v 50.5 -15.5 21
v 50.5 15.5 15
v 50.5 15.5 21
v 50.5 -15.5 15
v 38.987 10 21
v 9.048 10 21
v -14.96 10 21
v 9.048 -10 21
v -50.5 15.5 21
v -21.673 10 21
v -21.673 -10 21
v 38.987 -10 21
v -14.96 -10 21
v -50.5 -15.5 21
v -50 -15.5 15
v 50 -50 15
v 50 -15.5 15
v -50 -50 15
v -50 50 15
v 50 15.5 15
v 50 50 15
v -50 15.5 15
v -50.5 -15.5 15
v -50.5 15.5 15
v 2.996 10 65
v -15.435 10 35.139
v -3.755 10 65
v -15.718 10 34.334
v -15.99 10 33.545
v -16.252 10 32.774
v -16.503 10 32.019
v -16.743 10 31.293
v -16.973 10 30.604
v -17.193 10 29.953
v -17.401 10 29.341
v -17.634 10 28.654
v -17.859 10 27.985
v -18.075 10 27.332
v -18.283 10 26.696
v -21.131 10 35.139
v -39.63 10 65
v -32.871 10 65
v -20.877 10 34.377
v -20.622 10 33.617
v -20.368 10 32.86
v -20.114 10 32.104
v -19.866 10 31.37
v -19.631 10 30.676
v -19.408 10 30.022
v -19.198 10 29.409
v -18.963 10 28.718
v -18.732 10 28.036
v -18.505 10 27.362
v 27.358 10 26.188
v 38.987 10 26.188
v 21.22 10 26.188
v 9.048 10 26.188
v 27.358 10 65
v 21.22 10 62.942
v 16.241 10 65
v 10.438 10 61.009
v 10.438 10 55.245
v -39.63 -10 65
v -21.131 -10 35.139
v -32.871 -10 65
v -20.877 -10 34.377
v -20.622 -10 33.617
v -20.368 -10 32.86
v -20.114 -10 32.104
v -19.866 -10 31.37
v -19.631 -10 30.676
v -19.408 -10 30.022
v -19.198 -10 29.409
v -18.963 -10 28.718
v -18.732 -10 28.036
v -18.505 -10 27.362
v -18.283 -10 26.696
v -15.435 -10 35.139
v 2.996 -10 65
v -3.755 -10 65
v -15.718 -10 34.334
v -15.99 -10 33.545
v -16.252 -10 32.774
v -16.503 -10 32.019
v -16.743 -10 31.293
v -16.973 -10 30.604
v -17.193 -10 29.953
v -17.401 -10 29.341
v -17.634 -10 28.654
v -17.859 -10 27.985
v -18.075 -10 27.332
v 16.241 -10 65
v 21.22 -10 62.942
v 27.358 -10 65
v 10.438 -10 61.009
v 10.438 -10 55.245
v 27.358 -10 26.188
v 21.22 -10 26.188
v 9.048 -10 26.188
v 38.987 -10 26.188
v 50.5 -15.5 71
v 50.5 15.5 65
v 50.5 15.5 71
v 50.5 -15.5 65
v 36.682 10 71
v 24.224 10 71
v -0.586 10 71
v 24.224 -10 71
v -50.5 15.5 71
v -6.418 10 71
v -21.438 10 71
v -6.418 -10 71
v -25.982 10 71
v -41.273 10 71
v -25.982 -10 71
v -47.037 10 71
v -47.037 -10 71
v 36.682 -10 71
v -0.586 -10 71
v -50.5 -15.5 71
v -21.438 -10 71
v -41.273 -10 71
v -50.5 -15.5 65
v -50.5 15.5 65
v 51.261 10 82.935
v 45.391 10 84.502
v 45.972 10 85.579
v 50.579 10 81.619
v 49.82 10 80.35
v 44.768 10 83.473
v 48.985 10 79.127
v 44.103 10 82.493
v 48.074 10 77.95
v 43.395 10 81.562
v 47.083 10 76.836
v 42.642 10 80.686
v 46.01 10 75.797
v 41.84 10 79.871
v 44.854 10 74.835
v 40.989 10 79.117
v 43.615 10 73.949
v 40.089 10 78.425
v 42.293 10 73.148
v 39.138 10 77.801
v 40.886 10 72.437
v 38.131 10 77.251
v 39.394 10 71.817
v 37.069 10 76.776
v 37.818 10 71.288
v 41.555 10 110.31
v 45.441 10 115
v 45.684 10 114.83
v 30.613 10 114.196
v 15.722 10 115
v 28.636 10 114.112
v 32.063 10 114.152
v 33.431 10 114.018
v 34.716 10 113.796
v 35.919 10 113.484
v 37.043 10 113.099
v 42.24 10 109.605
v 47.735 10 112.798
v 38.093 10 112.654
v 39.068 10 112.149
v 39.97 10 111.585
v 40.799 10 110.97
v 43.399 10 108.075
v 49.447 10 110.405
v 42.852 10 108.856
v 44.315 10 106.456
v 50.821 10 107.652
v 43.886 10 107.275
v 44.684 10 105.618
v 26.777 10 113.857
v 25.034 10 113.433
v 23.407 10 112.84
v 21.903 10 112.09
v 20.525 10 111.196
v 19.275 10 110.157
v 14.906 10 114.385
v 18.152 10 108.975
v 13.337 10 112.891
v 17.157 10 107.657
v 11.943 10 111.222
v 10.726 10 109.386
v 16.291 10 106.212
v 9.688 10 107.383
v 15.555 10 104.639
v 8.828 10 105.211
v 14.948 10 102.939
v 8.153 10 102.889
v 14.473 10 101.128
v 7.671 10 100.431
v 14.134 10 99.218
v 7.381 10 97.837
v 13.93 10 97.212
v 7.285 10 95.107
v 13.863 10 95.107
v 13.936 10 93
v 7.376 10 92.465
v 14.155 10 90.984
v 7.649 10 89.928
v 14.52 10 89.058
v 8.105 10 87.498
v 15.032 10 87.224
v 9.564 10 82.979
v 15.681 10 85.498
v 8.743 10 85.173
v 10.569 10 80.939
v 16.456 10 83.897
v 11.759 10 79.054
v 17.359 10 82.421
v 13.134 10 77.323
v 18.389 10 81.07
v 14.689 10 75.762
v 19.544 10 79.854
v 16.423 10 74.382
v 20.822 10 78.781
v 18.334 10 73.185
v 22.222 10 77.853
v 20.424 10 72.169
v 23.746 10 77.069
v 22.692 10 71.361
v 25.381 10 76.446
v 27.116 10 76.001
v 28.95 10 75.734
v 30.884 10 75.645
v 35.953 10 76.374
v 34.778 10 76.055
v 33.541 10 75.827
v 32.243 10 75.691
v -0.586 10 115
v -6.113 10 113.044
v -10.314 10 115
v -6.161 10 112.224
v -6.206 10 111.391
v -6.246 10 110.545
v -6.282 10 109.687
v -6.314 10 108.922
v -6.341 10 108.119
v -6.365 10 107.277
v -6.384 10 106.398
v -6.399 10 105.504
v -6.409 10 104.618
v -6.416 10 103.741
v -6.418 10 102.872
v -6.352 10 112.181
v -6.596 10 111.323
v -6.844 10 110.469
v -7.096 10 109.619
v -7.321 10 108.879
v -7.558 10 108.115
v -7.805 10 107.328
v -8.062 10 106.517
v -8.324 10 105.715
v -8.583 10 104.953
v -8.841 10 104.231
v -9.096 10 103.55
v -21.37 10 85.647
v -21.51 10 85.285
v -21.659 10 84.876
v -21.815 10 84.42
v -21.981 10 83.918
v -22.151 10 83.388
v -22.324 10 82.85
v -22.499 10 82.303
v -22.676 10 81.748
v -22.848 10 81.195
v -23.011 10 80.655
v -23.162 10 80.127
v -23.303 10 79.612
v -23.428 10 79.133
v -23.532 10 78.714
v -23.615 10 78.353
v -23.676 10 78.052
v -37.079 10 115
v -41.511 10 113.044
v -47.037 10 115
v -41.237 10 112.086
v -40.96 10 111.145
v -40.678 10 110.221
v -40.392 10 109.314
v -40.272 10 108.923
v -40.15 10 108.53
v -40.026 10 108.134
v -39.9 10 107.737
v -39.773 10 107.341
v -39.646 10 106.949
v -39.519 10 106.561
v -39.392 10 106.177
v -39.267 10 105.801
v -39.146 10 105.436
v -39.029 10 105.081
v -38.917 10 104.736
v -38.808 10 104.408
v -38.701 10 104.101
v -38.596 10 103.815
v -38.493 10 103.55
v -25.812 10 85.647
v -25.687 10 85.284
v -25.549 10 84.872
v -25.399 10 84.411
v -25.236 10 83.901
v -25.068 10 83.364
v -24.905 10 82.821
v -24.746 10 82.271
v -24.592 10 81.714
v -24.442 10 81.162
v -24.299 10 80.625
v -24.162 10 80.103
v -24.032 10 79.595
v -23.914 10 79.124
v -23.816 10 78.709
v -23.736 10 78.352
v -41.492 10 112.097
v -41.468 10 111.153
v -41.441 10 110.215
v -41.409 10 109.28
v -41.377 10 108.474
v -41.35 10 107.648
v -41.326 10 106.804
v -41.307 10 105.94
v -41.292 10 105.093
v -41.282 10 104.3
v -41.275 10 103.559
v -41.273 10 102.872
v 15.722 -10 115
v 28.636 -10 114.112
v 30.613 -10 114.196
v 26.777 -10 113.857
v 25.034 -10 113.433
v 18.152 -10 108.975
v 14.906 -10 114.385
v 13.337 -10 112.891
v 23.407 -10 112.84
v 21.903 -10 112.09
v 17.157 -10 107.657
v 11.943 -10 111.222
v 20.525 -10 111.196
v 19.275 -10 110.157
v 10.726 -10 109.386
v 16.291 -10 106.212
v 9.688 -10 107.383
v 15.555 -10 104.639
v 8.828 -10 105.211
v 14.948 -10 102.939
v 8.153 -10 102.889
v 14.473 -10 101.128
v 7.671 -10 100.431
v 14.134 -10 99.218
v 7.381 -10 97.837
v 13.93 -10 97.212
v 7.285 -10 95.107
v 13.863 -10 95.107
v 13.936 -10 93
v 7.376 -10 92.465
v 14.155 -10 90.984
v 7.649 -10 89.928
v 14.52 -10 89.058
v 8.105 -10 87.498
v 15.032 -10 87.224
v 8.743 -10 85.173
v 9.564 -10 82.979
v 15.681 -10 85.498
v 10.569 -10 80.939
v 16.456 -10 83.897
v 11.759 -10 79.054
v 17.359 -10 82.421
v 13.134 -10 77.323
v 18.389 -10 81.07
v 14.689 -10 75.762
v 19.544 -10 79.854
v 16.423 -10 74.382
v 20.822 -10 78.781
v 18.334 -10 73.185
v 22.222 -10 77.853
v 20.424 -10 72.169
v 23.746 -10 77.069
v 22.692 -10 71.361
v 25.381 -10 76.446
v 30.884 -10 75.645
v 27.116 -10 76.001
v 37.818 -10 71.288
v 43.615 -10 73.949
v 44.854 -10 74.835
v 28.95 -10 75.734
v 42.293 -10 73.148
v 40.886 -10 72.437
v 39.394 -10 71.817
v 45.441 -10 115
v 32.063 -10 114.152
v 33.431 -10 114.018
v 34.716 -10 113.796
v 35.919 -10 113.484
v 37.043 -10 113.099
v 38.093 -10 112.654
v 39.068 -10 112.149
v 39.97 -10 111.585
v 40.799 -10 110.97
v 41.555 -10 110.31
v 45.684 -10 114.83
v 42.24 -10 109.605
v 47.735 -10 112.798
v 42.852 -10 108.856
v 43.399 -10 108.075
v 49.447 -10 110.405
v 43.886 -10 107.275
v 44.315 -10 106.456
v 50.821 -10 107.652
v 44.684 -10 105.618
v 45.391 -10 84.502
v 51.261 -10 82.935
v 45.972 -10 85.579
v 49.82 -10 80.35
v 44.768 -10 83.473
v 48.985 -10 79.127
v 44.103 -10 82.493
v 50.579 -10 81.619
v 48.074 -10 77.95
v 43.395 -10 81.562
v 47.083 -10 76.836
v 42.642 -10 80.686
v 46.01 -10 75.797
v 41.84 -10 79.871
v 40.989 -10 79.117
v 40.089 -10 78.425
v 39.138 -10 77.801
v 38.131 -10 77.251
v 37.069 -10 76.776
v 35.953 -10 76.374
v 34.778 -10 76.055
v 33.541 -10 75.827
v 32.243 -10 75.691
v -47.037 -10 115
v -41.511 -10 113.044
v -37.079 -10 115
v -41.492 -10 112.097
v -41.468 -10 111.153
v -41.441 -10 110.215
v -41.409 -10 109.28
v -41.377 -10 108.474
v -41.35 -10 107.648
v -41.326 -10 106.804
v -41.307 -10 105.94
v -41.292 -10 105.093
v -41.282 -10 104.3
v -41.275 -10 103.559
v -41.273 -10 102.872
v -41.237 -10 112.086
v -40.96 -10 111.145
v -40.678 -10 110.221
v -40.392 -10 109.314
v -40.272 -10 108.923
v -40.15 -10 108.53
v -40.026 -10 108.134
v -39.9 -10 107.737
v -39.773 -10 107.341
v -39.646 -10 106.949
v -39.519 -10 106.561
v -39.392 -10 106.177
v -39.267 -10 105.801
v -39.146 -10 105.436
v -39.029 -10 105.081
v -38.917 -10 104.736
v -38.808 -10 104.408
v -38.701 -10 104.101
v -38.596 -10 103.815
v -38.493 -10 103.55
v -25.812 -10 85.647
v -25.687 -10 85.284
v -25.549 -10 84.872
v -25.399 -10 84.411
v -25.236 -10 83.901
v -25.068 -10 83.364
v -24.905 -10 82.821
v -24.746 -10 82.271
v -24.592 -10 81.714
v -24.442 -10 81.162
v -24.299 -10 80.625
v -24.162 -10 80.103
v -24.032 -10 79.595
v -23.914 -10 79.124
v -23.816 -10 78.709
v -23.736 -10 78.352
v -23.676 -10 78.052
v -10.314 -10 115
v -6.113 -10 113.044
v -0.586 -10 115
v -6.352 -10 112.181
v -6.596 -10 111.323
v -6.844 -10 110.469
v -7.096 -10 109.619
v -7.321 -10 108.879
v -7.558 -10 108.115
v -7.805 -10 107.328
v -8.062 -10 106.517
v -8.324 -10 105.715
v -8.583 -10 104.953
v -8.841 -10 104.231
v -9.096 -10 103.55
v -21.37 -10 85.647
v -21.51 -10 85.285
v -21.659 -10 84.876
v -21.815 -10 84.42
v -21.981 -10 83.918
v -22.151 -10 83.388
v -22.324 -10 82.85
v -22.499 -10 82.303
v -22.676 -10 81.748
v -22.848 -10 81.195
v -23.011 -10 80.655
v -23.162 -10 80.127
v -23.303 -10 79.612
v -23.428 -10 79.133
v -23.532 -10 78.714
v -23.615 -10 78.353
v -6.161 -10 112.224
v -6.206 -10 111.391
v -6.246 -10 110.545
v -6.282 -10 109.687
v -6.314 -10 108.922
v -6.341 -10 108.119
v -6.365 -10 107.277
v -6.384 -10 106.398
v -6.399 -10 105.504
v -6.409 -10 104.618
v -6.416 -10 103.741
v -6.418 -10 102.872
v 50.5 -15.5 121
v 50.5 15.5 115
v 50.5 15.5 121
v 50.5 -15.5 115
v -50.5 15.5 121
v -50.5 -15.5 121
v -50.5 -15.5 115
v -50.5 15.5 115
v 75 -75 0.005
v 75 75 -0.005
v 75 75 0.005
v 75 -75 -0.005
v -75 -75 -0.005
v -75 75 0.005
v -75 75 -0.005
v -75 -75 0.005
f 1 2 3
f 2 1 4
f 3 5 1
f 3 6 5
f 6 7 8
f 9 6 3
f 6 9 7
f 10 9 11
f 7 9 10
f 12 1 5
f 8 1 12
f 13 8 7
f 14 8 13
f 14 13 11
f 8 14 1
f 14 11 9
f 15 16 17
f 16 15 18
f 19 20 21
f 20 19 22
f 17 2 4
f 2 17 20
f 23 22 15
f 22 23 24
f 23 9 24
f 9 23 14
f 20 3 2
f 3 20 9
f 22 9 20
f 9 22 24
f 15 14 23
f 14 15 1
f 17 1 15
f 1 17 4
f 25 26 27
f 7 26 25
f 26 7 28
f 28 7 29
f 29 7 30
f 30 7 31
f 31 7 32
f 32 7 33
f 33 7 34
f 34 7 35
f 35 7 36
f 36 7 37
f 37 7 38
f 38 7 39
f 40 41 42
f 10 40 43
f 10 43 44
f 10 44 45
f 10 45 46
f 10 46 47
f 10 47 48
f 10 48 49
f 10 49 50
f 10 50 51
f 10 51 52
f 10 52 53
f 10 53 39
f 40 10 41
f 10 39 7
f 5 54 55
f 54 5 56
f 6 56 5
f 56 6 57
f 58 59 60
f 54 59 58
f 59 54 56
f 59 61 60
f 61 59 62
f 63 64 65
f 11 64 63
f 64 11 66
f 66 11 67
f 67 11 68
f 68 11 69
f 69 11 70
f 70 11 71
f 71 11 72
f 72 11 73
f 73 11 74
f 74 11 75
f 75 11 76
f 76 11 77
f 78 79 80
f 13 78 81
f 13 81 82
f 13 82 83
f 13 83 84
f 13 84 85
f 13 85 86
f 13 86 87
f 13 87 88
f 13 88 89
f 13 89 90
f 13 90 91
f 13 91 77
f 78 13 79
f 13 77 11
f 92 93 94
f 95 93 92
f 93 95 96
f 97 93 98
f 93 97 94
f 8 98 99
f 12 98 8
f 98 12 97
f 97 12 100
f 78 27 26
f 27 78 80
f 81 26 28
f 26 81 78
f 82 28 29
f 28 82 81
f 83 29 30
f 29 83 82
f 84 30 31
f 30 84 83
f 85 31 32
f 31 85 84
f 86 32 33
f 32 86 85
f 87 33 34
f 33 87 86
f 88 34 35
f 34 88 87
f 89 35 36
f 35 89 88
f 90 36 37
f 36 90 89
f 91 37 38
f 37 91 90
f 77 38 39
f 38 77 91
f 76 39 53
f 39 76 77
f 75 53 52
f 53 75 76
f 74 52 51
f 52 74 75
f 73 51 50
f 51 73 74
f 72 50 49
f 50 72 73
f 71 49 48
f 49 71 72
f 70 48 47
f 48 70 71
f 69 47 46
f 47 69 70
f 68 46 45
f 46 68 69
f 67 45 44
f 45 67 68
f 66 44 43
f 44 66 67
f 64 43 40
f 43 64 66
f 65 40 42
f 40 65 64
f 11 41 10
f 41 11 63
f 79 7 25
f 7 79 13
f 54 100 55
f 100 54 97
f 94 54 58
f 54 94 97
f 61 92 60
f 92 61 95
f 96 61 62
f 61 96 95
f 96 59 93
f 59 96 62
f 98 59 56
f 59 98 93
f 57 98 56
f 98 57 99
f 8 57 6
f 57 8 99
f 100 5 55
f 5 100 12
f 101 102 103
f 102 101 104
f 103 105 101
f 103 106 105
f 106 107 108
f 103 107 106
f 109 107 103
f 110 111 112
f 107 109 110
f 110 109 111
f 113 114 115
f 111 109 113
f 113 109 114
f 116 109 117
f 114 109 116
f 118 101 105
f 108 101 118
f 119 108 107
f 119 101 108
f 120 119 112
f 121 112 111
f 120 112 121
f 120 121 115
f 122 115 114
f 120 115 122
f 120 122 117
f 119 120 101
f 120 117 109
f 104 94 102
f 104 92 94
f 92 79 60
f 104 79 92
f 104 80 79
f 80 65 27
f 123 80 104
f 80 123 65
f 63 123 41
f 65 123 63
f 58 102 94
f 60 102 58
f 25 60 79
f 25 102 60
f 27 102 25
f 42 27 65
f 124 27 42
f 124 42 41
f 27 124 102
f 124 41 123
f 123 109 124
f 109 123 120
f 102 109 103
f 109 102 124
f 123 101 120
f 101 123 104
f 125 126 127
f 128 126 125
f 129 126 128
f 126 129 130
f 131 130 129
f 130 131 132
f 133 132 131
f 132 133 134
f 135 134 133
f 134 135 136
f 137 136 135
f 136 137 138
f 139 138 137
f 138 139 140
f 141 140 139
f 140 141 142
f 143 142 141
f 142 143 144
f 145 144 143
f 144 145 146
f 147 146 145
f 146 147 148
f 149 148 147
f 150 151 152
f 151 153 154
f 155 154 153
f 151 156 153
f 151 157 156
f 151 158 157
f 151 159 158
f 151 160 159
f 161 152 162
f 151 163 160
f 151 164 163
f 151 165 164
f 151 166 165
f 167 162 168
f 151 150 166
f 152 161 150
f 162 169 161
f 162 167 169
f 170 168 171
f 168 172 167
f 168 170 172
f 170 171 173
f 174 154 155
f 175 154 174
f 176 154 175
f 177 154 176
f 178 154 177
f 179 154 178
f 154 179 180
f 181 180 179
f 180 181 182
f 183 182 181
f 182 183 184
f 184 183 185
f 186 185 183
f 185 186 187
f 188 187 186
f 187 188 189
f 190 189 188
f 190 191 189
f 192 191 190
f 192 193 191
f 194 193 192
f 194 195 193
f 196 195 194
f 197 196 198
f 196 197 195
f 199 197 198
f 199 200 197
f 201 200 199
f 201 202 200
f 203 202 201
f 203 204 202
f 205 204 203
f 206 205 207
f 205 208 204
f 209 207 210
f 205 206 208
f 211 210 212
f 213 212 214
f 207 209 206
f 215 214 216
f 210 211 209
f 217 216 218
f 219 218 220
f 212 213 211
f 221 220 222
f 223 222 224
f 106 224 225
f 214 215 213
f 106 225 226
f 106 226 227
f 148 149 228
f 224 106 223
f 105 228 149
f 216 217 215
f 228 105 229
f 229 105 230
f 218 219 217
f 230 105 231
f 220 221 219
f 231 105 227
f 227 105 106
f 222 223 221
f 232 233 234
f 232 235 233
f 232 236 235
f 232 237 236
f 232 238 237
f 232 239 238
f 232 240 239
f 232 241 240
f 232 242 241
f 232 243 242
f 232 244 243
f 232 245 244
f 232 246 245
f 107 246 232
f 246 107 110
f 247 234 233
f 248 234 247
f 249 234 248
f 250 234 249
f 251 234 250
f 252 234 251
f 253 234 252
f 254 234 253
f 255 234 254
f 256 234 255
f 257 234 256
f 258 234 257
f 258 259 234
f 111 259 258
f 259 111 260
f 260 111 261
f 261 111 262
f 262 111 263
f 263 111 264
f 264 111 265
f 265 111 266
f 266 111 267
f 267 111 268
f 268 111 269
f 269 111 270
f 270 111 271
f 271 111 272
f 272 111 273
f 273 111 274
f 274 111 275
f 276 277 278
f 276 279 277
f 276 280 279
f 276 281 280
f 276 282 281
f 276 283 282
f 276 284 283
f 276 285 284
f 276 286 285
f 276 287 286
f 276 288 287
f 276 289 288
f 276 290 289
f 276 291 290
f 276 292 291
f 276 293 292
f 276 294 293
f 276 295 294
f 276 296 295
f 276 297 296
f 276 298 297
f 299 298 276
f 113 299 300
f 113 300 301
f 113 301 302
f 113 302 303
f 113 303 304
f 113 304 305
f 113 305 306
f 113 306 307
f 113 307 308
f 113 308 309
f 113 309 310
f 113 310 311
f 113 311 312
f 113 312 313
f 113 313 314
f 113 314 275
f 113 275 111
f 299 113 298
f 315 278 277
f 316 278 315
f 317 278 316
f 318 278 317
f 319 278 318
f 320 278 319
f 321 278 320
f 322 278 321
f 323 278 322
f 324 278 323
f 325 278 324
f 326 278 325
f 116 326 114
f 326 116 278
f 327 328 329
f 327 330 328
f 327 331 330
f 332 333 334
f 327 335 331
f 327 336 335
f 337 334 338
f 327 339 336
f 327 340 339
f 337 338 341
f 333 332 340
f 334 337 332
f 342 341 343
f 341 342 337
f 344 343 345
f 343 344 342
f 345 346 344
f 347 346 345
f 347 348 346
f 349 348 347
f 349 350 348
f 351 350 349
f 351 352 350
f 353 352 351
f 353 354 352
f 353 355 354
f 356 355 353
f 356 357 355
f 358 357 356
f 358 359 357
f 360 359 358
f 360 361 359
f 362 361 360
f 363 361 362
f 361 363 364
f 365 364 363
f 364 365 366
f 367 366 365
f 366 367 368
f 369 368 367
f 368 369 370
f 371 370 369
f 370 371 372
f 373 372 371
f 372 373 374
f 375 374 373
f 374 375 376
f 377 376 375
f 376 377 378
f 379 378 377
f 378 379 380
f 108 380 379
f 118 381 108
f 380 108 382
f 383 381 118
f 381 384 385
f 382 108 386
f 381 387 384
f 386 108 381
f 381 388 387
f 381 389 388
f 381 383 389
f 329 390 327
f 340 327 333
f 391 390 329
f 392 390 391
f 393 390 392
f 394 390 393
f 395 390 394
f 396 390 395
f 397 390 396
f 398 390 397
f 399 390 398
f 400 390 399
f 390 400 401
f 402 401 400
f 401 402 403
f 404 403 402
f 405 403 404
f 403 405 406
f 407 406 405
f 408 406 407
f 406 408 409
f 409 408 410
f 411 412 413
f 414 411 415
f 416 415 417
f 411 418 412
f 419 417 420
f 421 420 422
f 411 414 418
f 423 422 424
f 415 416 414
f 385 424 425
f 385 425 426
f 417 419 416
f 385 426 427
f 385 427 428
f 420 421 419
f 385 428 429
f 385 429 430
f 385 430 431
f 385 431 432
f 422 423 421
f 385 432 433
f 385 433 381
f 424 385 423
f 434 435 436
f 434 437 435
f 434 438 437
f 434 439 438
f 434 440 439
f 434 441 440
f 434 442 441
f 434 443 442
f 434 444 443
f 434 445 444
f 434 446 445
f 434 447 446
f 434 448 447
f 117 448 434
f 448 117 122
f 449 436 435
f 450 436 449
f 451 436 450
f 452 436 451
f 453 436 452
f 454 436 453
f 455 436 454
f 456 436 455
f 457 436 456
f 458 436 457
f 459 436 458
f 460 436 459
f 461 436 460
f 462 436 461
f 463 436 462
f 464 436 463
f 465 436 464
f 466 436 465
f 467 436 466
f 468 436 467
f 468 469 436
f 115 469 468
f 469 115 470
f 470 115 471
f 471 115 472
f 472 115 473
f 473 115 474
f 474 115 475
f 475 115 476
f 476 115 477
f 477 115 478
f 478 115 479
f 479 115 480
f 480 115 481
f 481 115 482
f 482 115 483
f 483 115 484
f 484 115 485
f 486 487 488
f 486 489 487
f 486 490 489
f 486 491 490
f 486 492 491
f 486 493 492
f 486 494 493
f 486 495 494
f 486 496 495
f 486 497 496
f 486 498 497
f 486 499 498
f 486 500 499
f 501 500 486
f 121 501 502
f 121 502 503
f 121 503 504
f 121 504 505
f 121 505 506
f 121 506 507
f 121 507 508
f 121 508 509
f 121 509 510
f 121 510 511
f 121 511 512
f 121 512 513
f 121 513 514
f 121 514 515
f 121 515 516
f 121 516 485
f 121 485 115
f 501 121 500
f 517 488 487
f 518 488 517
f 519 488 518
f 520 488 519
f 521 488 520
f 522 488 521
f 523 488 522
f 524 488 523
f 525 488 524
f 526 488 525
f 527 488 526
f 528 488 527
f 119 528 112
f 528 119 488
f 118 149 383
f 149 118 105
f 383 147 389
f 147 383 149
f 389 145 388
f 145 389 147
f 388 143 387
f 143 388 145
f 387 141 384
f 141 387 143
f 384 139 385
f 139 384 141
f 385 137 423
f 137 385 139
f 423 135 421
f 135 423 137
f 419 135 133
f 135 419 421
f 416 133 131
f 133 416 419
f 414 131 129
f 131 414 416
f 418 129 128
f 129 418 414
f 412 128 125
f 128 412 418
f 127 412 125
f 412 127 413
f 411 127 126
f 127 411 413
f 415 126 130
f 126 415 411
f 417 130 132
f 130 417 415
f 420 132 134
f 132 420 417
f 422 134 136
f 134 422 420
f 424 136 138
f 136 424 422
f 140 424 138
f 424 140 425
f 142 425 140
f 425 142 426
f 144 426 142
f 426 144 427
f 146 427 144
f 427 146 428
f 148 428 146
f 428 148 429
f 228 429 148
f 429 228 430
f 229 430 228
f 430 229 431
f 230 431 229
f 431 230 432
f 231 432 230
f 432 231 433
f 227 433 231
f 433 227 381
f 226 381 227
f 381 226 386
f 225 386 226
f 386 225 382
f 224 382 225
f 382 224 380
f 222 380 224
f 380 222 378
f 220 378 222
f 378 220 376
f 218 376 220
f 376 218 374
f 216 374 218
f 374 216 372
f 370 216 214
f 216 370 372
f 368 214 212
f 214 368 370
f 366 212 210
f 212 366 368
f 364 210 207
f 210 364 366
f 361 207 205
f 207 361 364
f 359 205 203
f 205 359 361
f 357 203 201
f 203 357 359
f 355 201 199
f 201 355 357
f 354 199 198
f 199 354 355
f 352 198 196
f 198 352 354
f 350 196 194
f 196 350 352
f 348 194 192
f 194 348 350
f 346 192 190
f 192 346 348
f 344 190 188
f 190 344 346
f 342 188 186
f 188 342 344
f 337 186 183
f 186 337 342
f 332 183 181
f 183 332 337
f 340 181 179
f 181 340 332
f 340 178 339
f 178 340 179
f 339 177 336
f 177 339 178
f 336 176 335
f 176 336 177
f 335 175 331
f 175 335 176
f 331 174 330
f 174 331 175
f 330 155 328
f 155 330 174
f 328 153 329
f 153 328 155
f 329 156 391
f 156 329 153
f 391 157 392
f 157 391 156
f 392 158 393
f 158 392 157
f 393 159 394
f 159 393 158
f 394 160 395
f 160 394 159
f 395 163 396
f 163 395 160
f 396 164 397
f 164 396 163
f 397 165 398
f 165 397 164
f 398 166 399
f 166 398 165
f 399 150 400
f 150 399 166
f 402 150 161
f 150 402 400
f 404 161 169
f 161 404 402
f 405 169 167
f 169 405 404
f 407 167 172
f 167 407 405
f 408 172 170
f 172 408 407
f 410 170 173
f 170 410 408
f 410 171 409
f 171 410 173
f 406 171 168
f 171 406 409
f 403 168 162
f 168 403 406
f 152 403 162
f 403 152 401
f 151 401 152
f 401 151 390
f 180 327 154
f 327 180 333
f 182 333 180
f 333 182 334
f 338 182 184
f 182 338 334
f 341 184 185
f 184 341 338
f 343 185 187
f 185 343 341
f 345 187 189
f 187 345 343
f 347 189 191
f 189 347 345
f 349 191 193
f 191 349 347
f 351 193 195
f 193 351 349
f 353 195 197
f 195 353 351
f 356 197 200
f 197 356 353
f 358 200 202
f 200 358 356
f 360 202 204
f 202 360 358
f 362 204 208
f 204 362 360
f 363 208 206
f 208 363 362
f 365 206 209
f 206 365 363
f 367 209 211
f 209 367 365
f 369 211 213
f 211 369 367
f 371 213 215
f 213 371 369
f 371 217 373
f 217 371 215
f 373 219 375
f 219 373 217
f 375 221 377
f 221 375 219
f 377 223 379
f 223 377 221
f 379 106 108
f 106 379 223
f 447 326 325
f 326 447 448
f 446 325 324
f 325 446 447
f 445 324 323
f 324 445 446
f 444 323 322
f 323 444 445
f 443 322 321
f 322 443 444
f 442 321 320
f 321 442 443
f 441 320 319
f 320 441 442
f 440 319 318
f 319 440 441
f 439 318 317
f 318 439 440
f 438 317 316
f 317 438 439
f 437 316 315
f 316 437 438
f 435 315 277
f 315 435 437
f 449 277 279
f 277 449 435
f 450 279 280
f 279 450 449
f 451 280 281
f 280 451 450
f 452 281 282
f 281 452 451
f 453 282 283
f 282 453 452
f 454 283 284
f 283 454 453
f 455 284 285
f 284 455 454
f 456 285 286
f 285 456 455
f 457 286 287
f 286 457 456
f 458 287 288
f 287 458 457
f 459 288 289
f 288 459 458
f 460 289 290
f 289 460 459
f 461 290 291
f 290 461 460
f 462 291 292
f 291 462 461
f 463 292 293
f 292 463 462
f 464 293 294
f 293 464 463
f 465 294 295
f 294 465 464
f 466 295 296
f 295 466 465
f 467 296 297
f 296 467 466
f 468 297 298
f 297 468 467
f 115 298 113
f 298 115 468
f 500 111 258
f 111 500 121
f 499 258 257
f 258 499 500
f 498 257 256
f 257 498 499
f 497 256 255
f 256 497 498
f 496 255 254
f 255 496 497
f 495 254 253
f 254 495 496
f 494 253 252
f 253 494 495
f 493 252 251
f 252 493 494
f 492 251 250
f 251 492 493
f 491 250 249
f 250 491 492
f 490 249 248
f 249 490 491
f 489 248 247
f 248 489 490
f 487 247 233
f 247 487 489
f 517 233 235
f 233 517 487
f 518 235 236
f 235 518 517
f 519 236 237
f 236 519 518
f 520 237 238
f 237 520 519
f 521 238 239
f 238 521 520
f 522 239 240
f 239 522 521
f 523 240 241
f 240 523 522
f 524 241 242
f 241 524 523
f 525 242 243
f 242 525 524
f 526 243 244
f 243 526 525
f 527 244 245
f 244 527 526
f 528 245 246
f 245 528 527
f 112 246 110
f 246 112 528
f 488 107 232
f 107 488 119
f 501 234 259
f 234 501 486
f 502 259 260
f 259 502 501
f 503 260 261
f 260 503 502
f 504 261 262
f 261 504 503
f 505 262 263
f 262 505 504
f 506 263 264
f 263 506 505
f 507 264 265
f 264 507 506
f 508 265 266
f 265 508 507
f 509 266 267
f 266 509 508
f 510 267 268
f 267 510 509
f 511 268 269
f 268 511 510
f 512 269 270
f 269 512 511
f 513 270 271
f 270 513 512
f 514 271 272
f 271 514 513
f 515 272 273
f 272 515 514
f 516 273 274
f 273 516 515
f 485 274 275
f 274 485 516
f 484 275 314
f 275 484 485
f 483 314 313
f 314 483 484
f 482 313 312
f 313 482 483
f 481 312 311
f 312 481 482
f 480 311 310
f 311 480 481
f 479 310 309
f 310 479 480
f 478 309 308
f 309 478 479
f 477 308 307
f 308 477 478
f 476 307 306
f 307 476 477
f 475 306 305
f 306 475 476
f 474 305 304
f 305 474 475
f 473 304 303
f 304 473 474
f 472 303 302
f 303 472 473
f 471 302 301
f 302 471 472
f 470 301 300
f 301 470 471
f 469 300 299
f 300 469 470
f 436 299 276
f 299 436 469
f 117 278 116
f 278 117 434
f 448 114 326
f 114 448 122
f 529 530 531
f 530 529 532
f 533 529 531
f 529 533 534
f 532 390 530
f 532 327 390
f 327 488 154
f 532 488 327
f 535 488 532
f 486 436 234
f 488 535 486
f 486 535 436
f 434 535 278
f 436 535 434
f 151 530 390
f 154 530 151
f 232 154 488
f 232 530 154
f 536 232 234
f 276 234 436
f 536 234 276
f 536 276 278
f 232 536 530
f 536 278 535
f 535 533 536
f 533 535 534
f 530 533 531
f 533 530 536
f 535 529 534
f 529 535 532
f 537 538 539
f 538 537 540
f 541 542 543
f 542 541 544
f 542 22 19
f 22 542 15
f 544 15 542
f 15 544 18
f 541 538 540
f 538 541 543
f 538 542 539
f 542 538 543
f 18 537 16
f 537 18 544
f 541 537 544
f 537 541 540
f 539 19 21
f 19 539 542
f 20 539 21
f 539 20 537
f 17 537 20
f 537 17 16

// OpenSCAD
//Trophies
//because everyone's a weiner
//by eriqjo May 2015

/* [Select Parts] */

Include_Base = 1; // [1:Yes, 2:No]

Include_Pillars = 3; // [1:All, 2:Standalone Pillar, 3:None]

Include_Top_Plate = 2; // [1:Yes, 2:No]

/**********************************************************************/

/* [Core Dimensions] */

//Style
Base_Style = 2; // [1:1-Classic, 2:2-Tapered Pedastal, 3:3-Octagonal, 4:4-Squared Semi-Circle]

dimA = 150;
dimB = 150;
dimC = 15;
dimD = 5;
dimE = 100;
dimF = 40;

//Hole depth, mm:
Hole_Depth = 0;

//Hole diameter, mm:
Hole_Dia = 6;

//Peg height, mm:
Peg_Height = 0;

//Peg diameter, mm:
Peg_Dia = 5.5;

/**********************************************************************/

/* [Pillars] */

//Round or square pillar
Pillar_Shape = 1; // [1:Square, 2:Circle]

//Number of pillars
Number_of_Pillars = 0; // [0:0, 2:2, 4:4]

//Center-to-center distance of the pillars in the x-direction, mm: 
X_Between = 80;

//Center-to-center distance of the pillars in the y-direction (if 4 pillars), mm: 
Y_Between = 50;

//Height, mm:
Pillar_Height = 0;

//Diameter of circle/width of square, mm:
Outer_Dia = 15; // [5:50]

//# of depressions (if square, # per side limit 3):
Number_of_Depressions = 10; // [0:20]

//Number of pillar twists (90 degrees each):
Twists = 1; // [0:5]

//Slide to move pillars fore-aft as desired:
Y_Adjustment = 0; // [-50:50]

//Slide to move pillars side-to-side as desired:
X_Adjustment = 0; // [-50:50]

/******************************************************************/

/* [ emblem ] */
emblem_text = "V1";
emblem_text_2 = "MC";
emblem_height = 50;
emblem_depth = 20;
emblem_plate_thickness = 6;

/* [Top Plate] */

//Thickness to make the top plate, mm:
Plate_Thickness = 0;

//# of pegs in the x-direction
X_Pegs = 0; // [0:4]

//Distance between each peg in x-direction, mm:
X_Peg_Offset = 90;

//# of pegs in the y-direction:
Y_Pegs = 0; // [0:4]

//Distance between each peg in y-direction, mm:
Y_Peg_Offset = emblem_depth;

//Height of the top-plate pegs, mm:
Top_Peg_Height = 0;

//Diameter of the top-plate pegs
Top_Peg_Diameter = 5.5;


module emblem() {
    z_emblem_base = dimC - emblem_plate_thickness;

    translate([0, 0, z_emblem_base]){
        translate([
            -X_Peg_Offset / 2 - Top_Peg_Diameter, 
            -Y_Peg_Offset / 2 - Top_Peg_Diameter, 
            emblem_plate_thickness])
            cube([
                X_Peg_Offset + 2 * Top_Peg_Diameter, 
                Y_Peg_Offset + 2 * Top_Peg_Diameter, 
                emblem_plate_thickness]);
        translate([0, emblem_depth / 2, 2 * emblem_plate_thickness])
            rotate([90, 0, 0])
                linear_extrude(emblem_depth)
                    text(emblem_text, emblem_height, halign="center");
        translate([
            -X_Peg_Offset / 2 - Top_Peg_Diameter, 
            -Y_Peg_Offset / 2 - Top_Peg_Diameter, 
            emblem_plate_thickness + emblem_height])
            cube([X_Peg_Offset + 2 * Top_Peg_Diameter, 
                Y_Peg_Offset + 2 * Top_Peg_Diameter, emblem_plate_thickness]);
        translate([0, emblem_depth / 2, 2 * emblem_plate_thickness + emblem_height])
            rotate([90, 0, 0])
                linear_extrude(emblem_depth)
                    text(emblem_text_2, emblem_height, halign="center");
        translate([
            -X_Peg_Offset / 2 - Top_Peg_Diameter, 
            -Y_Peg_Offset / 2 - Top_Peg_Diameter, 
            2 * emblem_height + emblem_plate_thickness])
            cube([X_Peg_Offset + 2 * Top_Peg_Diameter, 
                Y_Peg_Offset + 2 * Top_Peg_Diameter, emblem_plate_thickness]);
    }
}

emblem();

/******** END CUSTOMIZER VARIABLES **********/

depression_limiter = (3 < Number_of_Depressions) ? 3 : Number_of_Depressions; //don't want to make more than 3 for squares
square_depression_dia = (Outer_Dia)/(2 * depression_limiter);
circle_depression_dia = (3.14 * Outer_Dia)/(2 * Number_of_Depressions);


module array(y_correction = 0){

	n_x = (Number_of_Pillars > 0) ? 2 : 0;
	x_dist = X_Between;
	n_y = (Number_of_Pillars > 0) ? Number_of_Pillars/2 : 0;
	y_dist = Y_Between;

	translate([X_Adjustment, Y_Adjustment, 0]){	//manually moving the pillars with the slider control
		translate([-1*(n_x-1)*x_dist/2, -(n_y-1)*y_dist/2 + y_correction, 0]){
			for (j = [0:n_y-1]){
				for (i = [0:n_x-1]){
					translate([i*x_dist, j*y_dist, 0])
						children(0);
				}//for i
			}//for j
		}//translate
	}//translate
}//module array

module topPegArray(y_correction = 0){
	if(X_Pegs > 0 && Y_Pegs > 0){
		n_x = X_Pegs;
		x_dist = X_Peg_Offset;
		n_y = Y_Pegs;
		y_dist = Y_Peg_Offset;

		translate([0, 0, 0]){	//manually moving the pillars with the slider control
			translate([-1*(n_x-1)*x_dist/2, -(n_y-1)*y_dist/2 + y_correction, 0]){
				for (j = [0:n_y-1]){
					for (i = [0:n_x-1]){
						translate([i*x_dist, j*y_dist, 0])
							children(0);
					}//for i
				}//for j
			}//translate
		}//translate
	}//if
}//module topPegArray

module pegs(z_move = 0){
	translate([0,0,z_move])
		cylinder(h = Peg_Height, r = Peg_Dia/2, $fn = 12, center = false);
}//module add pegs to

module holes(z_move = 0){
	translate([0, 0, z_move - 0.1])
		cylinder(h = Hole_Depth + 0.1, r = Hole_Dia/2, $fn = 12, center = false);
}//module holes

module pillars(holeZ = 0, pegZ = Pillar_Height, translateZ = 0){

	translate([0, 0, translateZ]){
		if (Pillar_Shape == 1){	//square pillar
			union(){
				difference(){		//subtracts the depressions and bottom holes
					linear_extrude(height = Pillar_Height, center = false, convexity = 20, twist = 90 * Twists)	//main square body for pillar
						square([Outer_Dia, Outer_Dia], center = true);
					translate([0, 0, -0.5]){
						for (i = [0:3]){	//for each of the 4 sides of the square
							for (j = [0:depression_limiter - 1]){	//for the number of depressions per side
								rotate([0, 0, i * 90])
									linear_extrude(height = Pillar_Height + 1, center = false, convexity = 20, twist = 90 * Twists)
										translate([Outer_Dia/2, Outer_Dia * ((j + 1)/(depression_limiter + 1)) - Outer_Dia/2, -0.1])
											circle(r = square_depression_dia/2, center = true);		//subtracting this cylinder from the square
							}//for j
						}//for i
					}//translate	
					holes();
				}//difference
				pegs(pegZ);
			}//union
		}//if
			
		if (Pillar_Shape == 2){  //round pillar
			union(){
				difference(){
					cylinder(h = Pillar_Height, r = Outer_Dia/2, $fn = 20, center = false);	//the solid cylinder
					translate([0, 0, -0.5]){
						for (i = [0:Number_of_Depressions-1]){		//creating all of the subtraction cylinders
							rotate(a = [0, 0, i * 360/Number_of_Depressions])
								linear_extrude(height = Pillar_Height + 1, center = false, convexity = 20, twist = 90 * Twists)	
									translate([Outer_Dia/2, 0, -0.1])
										circle(r = circle_depression_dia/2, center = true);
						}//for
					}//translate
					//TODO create new holes function
					holes();
				}//difference
				//TODO correct peg function
				pegs(pegZ);
			}//union
		}//if
	}//translate
		
}//module

module pillarHelper(y, z){

		if (Include_Pillars == 1){	//include all pillars
			array(y_correction = y)
				pillars(translateZ = z);
		}//if include pillars == 1
		
		if (Include_Pillars == 2){
			pillars();
		}
}


//********************************BASE 1********************************

if (Base_Style == 1){

	y_center = dimB/2 - dimE/2 - dimD;
	z_base_peg = dimC + dimF;
	z_pillar_hole = z_base_peg;		//the hole in the pillar is the same height as the peg in the base
	z_pillar_peg = z_pillar_hole + Pillar_Height;
	z_top_plate_hole = z_pillar_peg;
	z_top_plate_peg = z_top_plate_hole + Plate_Thickness;
			
	if (Include_Base == 1){	//build base		
		union(){
			translate([0, 0, dimC/2])
				cube([dimA, dimB, dimC], center = true);
			hull(){
				translate([0, 0, dimC/2])	//base of the wedge
					cube([dimA - 2*dimD, dimB - 2*dimD, dimC], center = true);
				translate([0, ((dimB - 2*dimD) - dimE)/2, (dimC + dimF)/2])		//top platform of the wedge
					cube([dimA - 2*dimD, dimE, dimC + dimF], center = true);
			}//hull
			if (Number_of_Pillars > 0){		//doesn't add pegs if there are 0 pillars
				array(y_center)
					pegs(z_base_peg);
			}//if
		}//union
	}//if include base
	
	pillarHelper(y_center, z_base_peg);	//build pillars if included
	
	if (Include_Top_Plate == 1){
		difference(){
			translate( [0, ((dimB - 2*dimD) - dimE)/2, z_top_plate_hole + Plate_Thickness/2]){
				union(){
					cube([dimA - 2*dimD, dimE, Plate_Thickness], center = true);
					topPegArray(0)
						pegs(Plate_Thickness/2);
				}//union
			}//translate
			array(y_center)
				holes(z_top_plate_hole);
		}//difference
	}//if include top plate
	
}//base1

//********************************BASE 2********************************

if (Base_Style == 2){

	y_center = 0;
	z_base_peg = dimC;
	z_pillar_hole = z_base_peg;		//the hole in the pillar is the same height as the peg in the base
	z_pillar_peg = z_pillar_hole + Pillar_Height;
	z_top_plate_hole = z_pillar_peg;
	z_top_plate_peg = z_top_plate_hole + Plate_Thickness;
	
	if (Include_Base ==1){	//build base
		union(){
			hull(){
				cube([dimA, dimB, 0.01], center = true);
				translate([0, 0, dimC/2])
					cube([dimE, dimE, dimC], center = true);
			}//hull
			if (Number_of_Pillars > 0){
				array(y_center)
					pegs(z_base_peg);
			}//if
		}//union
	}//if include base
	
	//pillarHelper(y_center, z_base_peg);
	
	if (Include_Top_Plate == 1){
		difference(){
			translate( [0, 0, z_top_plate_hole + Plate_Thickness/2]){
				union(){
					cube([dimE, dimE, Plate_Thickness], center = true);
					topPegArray(0)
						pegs(Plate_Thickness/2);
				}//union
			}//translate
			//array(y_center)
			//	holes(z_top_plate_hole);
		}//difference
	}//module include top plate
	
}//base2

//********************************BASE 3********************************	

if (Base_Style == 3){

	y_center = 0;
	z_base_peg = dimC + dimF;
	z_pillar_hole = z_base_peg;		//the hole in the pillar is the same height as the peg in the base
	z_pillar_peg = z_pillar_hole + Pillar_Height;
	z_top_plate_hole = z_pillar_peg;
	z_top_plate_peg = z_top_plate_hole + Plate_Thickness;

	if (Include_Base ==1){	//build base
		union(){
			translate([0, 0, dimC/2])
				cube([dimA, dimA, dimC], center = true);
			translate([0, 0, dimC - 0.1])
				rotate([0, 0, 135/2])
					cylinder(h = dimF + 0.1, r = dimA/2, center = false, $fn = 8);
			if (Number_of_Pillars > 0){
				array(y_center)
					pegs(z_base_peg);
			}//if
		}//union
	}//if include base	
	
	pillarHelper(y_center, z_base_peg);
	
	if (Include_Top_Plate == 1){
		difference(){
			translate( [0, 0, z_top_plate_hole + Plate_Thickness/2]){
				union(){
					rotate([0, 0, 135/2])
						cylinder(h = Plate_Thickness, r = dimA/2, center = true, $fn = 8);
					topPegArray(0)
						pegs(Plate_Thickness/2);
				}//union
			}//translate
			array(y_center)
				holes(z_top_plate_hole);
		}//difference
	}// include top plate
	
}//base3

//********************************BASE 4********************************

if (Base_Style == 4){

	y_center = (dimA - dimB)/2;
	z_base_peg = dimC;
	z_pillar_hole = z_base_peg;		//the hole in the pillar is the same height as the peg in the base
	z_pillar_peg = z_pillar_hole + Pillar_Height;
	z_top_plate_hole = z_pillar_peg;
	z_top_plate_peg = z_top_plate_hole + Plate_Thickness;

	if (Include_Base ==1){	//build base
		if (dimB >= (dimA/2)){
			union(){
				difference(){	//creates the rear rounded part of the base
					cylinder(h = dimC, r = dimA/2, center = false);
					translate([0, -dimA, (dimC + 1)/2 - 0.5])
						cube([ dimA + 2, 2 * dimA, dimC + 1], center = true); //the cutting cube
				}//difference
				translate([0, -(dimB - (dimA/2))/2, dimC/2])		//creates the front rectangular section
					cube([dimA, dimB - (dimA/2) + 0.01, dimC], center = true);
				//TODO pegs here
				if (Number_of_Pillars > 0){
				array(y_center)
					pegs(z_base_peg);
				}//if
			}//union
		}//if
			
		if (dimB < (dimA/2)){	//error message for unacceptable dimensions
			text("DimB must be at least 1/2 of DimA", size = 5, valign = 0, halign = 0);
		}
	}//if include base	
	
	pillarHelper(y_center, z_base_peg);
	
	if (Include_Top_Plate == 1){
		difference(){
			translate( [0, 0, z_top_plate_hole ]){
				union(){
					if (dimB >= (dimA/2)){
						union(){
							difference(){	//creates the rear rounded part of the base
								cylinder(h = Plate_Thickness, r = dimA/2, center = false);		//the cylinder to be cut in half
								translate([0, -dimA, (Plate_Thickness + 1)/2 - 0.5])
									cube([ dimA + 2, 2 * dimA, Plate_Thickness + 1], center = true);	//the cutting cube
							}//difference
							translate([0, -(dimB - (dimA/2))/2, Plate_Thickness/2])		//creates the front rectangular section
								cube([dimA, dimB - (dimA/2) + 0.01, Plate_Thickness], center = true);
							//TODO pegs here
							if (Number_of_Pillars > 0){
								topPegArray(0)
									pegs(Plate_Thickness);
							}//if
						}//union
					}//if
			
					if (dimB < (dimA/2)){	//error message for unacceptable dimensions
						text("DimB must be at least 1/2 of DimA", size = 5, valign = 0, halign = 0);
					}//if 
					
				}//union
			}//translate
			array(y_center)
				holes(z_top_plate_hole);
		}//difference
	}// include top plate
	
}//base4
